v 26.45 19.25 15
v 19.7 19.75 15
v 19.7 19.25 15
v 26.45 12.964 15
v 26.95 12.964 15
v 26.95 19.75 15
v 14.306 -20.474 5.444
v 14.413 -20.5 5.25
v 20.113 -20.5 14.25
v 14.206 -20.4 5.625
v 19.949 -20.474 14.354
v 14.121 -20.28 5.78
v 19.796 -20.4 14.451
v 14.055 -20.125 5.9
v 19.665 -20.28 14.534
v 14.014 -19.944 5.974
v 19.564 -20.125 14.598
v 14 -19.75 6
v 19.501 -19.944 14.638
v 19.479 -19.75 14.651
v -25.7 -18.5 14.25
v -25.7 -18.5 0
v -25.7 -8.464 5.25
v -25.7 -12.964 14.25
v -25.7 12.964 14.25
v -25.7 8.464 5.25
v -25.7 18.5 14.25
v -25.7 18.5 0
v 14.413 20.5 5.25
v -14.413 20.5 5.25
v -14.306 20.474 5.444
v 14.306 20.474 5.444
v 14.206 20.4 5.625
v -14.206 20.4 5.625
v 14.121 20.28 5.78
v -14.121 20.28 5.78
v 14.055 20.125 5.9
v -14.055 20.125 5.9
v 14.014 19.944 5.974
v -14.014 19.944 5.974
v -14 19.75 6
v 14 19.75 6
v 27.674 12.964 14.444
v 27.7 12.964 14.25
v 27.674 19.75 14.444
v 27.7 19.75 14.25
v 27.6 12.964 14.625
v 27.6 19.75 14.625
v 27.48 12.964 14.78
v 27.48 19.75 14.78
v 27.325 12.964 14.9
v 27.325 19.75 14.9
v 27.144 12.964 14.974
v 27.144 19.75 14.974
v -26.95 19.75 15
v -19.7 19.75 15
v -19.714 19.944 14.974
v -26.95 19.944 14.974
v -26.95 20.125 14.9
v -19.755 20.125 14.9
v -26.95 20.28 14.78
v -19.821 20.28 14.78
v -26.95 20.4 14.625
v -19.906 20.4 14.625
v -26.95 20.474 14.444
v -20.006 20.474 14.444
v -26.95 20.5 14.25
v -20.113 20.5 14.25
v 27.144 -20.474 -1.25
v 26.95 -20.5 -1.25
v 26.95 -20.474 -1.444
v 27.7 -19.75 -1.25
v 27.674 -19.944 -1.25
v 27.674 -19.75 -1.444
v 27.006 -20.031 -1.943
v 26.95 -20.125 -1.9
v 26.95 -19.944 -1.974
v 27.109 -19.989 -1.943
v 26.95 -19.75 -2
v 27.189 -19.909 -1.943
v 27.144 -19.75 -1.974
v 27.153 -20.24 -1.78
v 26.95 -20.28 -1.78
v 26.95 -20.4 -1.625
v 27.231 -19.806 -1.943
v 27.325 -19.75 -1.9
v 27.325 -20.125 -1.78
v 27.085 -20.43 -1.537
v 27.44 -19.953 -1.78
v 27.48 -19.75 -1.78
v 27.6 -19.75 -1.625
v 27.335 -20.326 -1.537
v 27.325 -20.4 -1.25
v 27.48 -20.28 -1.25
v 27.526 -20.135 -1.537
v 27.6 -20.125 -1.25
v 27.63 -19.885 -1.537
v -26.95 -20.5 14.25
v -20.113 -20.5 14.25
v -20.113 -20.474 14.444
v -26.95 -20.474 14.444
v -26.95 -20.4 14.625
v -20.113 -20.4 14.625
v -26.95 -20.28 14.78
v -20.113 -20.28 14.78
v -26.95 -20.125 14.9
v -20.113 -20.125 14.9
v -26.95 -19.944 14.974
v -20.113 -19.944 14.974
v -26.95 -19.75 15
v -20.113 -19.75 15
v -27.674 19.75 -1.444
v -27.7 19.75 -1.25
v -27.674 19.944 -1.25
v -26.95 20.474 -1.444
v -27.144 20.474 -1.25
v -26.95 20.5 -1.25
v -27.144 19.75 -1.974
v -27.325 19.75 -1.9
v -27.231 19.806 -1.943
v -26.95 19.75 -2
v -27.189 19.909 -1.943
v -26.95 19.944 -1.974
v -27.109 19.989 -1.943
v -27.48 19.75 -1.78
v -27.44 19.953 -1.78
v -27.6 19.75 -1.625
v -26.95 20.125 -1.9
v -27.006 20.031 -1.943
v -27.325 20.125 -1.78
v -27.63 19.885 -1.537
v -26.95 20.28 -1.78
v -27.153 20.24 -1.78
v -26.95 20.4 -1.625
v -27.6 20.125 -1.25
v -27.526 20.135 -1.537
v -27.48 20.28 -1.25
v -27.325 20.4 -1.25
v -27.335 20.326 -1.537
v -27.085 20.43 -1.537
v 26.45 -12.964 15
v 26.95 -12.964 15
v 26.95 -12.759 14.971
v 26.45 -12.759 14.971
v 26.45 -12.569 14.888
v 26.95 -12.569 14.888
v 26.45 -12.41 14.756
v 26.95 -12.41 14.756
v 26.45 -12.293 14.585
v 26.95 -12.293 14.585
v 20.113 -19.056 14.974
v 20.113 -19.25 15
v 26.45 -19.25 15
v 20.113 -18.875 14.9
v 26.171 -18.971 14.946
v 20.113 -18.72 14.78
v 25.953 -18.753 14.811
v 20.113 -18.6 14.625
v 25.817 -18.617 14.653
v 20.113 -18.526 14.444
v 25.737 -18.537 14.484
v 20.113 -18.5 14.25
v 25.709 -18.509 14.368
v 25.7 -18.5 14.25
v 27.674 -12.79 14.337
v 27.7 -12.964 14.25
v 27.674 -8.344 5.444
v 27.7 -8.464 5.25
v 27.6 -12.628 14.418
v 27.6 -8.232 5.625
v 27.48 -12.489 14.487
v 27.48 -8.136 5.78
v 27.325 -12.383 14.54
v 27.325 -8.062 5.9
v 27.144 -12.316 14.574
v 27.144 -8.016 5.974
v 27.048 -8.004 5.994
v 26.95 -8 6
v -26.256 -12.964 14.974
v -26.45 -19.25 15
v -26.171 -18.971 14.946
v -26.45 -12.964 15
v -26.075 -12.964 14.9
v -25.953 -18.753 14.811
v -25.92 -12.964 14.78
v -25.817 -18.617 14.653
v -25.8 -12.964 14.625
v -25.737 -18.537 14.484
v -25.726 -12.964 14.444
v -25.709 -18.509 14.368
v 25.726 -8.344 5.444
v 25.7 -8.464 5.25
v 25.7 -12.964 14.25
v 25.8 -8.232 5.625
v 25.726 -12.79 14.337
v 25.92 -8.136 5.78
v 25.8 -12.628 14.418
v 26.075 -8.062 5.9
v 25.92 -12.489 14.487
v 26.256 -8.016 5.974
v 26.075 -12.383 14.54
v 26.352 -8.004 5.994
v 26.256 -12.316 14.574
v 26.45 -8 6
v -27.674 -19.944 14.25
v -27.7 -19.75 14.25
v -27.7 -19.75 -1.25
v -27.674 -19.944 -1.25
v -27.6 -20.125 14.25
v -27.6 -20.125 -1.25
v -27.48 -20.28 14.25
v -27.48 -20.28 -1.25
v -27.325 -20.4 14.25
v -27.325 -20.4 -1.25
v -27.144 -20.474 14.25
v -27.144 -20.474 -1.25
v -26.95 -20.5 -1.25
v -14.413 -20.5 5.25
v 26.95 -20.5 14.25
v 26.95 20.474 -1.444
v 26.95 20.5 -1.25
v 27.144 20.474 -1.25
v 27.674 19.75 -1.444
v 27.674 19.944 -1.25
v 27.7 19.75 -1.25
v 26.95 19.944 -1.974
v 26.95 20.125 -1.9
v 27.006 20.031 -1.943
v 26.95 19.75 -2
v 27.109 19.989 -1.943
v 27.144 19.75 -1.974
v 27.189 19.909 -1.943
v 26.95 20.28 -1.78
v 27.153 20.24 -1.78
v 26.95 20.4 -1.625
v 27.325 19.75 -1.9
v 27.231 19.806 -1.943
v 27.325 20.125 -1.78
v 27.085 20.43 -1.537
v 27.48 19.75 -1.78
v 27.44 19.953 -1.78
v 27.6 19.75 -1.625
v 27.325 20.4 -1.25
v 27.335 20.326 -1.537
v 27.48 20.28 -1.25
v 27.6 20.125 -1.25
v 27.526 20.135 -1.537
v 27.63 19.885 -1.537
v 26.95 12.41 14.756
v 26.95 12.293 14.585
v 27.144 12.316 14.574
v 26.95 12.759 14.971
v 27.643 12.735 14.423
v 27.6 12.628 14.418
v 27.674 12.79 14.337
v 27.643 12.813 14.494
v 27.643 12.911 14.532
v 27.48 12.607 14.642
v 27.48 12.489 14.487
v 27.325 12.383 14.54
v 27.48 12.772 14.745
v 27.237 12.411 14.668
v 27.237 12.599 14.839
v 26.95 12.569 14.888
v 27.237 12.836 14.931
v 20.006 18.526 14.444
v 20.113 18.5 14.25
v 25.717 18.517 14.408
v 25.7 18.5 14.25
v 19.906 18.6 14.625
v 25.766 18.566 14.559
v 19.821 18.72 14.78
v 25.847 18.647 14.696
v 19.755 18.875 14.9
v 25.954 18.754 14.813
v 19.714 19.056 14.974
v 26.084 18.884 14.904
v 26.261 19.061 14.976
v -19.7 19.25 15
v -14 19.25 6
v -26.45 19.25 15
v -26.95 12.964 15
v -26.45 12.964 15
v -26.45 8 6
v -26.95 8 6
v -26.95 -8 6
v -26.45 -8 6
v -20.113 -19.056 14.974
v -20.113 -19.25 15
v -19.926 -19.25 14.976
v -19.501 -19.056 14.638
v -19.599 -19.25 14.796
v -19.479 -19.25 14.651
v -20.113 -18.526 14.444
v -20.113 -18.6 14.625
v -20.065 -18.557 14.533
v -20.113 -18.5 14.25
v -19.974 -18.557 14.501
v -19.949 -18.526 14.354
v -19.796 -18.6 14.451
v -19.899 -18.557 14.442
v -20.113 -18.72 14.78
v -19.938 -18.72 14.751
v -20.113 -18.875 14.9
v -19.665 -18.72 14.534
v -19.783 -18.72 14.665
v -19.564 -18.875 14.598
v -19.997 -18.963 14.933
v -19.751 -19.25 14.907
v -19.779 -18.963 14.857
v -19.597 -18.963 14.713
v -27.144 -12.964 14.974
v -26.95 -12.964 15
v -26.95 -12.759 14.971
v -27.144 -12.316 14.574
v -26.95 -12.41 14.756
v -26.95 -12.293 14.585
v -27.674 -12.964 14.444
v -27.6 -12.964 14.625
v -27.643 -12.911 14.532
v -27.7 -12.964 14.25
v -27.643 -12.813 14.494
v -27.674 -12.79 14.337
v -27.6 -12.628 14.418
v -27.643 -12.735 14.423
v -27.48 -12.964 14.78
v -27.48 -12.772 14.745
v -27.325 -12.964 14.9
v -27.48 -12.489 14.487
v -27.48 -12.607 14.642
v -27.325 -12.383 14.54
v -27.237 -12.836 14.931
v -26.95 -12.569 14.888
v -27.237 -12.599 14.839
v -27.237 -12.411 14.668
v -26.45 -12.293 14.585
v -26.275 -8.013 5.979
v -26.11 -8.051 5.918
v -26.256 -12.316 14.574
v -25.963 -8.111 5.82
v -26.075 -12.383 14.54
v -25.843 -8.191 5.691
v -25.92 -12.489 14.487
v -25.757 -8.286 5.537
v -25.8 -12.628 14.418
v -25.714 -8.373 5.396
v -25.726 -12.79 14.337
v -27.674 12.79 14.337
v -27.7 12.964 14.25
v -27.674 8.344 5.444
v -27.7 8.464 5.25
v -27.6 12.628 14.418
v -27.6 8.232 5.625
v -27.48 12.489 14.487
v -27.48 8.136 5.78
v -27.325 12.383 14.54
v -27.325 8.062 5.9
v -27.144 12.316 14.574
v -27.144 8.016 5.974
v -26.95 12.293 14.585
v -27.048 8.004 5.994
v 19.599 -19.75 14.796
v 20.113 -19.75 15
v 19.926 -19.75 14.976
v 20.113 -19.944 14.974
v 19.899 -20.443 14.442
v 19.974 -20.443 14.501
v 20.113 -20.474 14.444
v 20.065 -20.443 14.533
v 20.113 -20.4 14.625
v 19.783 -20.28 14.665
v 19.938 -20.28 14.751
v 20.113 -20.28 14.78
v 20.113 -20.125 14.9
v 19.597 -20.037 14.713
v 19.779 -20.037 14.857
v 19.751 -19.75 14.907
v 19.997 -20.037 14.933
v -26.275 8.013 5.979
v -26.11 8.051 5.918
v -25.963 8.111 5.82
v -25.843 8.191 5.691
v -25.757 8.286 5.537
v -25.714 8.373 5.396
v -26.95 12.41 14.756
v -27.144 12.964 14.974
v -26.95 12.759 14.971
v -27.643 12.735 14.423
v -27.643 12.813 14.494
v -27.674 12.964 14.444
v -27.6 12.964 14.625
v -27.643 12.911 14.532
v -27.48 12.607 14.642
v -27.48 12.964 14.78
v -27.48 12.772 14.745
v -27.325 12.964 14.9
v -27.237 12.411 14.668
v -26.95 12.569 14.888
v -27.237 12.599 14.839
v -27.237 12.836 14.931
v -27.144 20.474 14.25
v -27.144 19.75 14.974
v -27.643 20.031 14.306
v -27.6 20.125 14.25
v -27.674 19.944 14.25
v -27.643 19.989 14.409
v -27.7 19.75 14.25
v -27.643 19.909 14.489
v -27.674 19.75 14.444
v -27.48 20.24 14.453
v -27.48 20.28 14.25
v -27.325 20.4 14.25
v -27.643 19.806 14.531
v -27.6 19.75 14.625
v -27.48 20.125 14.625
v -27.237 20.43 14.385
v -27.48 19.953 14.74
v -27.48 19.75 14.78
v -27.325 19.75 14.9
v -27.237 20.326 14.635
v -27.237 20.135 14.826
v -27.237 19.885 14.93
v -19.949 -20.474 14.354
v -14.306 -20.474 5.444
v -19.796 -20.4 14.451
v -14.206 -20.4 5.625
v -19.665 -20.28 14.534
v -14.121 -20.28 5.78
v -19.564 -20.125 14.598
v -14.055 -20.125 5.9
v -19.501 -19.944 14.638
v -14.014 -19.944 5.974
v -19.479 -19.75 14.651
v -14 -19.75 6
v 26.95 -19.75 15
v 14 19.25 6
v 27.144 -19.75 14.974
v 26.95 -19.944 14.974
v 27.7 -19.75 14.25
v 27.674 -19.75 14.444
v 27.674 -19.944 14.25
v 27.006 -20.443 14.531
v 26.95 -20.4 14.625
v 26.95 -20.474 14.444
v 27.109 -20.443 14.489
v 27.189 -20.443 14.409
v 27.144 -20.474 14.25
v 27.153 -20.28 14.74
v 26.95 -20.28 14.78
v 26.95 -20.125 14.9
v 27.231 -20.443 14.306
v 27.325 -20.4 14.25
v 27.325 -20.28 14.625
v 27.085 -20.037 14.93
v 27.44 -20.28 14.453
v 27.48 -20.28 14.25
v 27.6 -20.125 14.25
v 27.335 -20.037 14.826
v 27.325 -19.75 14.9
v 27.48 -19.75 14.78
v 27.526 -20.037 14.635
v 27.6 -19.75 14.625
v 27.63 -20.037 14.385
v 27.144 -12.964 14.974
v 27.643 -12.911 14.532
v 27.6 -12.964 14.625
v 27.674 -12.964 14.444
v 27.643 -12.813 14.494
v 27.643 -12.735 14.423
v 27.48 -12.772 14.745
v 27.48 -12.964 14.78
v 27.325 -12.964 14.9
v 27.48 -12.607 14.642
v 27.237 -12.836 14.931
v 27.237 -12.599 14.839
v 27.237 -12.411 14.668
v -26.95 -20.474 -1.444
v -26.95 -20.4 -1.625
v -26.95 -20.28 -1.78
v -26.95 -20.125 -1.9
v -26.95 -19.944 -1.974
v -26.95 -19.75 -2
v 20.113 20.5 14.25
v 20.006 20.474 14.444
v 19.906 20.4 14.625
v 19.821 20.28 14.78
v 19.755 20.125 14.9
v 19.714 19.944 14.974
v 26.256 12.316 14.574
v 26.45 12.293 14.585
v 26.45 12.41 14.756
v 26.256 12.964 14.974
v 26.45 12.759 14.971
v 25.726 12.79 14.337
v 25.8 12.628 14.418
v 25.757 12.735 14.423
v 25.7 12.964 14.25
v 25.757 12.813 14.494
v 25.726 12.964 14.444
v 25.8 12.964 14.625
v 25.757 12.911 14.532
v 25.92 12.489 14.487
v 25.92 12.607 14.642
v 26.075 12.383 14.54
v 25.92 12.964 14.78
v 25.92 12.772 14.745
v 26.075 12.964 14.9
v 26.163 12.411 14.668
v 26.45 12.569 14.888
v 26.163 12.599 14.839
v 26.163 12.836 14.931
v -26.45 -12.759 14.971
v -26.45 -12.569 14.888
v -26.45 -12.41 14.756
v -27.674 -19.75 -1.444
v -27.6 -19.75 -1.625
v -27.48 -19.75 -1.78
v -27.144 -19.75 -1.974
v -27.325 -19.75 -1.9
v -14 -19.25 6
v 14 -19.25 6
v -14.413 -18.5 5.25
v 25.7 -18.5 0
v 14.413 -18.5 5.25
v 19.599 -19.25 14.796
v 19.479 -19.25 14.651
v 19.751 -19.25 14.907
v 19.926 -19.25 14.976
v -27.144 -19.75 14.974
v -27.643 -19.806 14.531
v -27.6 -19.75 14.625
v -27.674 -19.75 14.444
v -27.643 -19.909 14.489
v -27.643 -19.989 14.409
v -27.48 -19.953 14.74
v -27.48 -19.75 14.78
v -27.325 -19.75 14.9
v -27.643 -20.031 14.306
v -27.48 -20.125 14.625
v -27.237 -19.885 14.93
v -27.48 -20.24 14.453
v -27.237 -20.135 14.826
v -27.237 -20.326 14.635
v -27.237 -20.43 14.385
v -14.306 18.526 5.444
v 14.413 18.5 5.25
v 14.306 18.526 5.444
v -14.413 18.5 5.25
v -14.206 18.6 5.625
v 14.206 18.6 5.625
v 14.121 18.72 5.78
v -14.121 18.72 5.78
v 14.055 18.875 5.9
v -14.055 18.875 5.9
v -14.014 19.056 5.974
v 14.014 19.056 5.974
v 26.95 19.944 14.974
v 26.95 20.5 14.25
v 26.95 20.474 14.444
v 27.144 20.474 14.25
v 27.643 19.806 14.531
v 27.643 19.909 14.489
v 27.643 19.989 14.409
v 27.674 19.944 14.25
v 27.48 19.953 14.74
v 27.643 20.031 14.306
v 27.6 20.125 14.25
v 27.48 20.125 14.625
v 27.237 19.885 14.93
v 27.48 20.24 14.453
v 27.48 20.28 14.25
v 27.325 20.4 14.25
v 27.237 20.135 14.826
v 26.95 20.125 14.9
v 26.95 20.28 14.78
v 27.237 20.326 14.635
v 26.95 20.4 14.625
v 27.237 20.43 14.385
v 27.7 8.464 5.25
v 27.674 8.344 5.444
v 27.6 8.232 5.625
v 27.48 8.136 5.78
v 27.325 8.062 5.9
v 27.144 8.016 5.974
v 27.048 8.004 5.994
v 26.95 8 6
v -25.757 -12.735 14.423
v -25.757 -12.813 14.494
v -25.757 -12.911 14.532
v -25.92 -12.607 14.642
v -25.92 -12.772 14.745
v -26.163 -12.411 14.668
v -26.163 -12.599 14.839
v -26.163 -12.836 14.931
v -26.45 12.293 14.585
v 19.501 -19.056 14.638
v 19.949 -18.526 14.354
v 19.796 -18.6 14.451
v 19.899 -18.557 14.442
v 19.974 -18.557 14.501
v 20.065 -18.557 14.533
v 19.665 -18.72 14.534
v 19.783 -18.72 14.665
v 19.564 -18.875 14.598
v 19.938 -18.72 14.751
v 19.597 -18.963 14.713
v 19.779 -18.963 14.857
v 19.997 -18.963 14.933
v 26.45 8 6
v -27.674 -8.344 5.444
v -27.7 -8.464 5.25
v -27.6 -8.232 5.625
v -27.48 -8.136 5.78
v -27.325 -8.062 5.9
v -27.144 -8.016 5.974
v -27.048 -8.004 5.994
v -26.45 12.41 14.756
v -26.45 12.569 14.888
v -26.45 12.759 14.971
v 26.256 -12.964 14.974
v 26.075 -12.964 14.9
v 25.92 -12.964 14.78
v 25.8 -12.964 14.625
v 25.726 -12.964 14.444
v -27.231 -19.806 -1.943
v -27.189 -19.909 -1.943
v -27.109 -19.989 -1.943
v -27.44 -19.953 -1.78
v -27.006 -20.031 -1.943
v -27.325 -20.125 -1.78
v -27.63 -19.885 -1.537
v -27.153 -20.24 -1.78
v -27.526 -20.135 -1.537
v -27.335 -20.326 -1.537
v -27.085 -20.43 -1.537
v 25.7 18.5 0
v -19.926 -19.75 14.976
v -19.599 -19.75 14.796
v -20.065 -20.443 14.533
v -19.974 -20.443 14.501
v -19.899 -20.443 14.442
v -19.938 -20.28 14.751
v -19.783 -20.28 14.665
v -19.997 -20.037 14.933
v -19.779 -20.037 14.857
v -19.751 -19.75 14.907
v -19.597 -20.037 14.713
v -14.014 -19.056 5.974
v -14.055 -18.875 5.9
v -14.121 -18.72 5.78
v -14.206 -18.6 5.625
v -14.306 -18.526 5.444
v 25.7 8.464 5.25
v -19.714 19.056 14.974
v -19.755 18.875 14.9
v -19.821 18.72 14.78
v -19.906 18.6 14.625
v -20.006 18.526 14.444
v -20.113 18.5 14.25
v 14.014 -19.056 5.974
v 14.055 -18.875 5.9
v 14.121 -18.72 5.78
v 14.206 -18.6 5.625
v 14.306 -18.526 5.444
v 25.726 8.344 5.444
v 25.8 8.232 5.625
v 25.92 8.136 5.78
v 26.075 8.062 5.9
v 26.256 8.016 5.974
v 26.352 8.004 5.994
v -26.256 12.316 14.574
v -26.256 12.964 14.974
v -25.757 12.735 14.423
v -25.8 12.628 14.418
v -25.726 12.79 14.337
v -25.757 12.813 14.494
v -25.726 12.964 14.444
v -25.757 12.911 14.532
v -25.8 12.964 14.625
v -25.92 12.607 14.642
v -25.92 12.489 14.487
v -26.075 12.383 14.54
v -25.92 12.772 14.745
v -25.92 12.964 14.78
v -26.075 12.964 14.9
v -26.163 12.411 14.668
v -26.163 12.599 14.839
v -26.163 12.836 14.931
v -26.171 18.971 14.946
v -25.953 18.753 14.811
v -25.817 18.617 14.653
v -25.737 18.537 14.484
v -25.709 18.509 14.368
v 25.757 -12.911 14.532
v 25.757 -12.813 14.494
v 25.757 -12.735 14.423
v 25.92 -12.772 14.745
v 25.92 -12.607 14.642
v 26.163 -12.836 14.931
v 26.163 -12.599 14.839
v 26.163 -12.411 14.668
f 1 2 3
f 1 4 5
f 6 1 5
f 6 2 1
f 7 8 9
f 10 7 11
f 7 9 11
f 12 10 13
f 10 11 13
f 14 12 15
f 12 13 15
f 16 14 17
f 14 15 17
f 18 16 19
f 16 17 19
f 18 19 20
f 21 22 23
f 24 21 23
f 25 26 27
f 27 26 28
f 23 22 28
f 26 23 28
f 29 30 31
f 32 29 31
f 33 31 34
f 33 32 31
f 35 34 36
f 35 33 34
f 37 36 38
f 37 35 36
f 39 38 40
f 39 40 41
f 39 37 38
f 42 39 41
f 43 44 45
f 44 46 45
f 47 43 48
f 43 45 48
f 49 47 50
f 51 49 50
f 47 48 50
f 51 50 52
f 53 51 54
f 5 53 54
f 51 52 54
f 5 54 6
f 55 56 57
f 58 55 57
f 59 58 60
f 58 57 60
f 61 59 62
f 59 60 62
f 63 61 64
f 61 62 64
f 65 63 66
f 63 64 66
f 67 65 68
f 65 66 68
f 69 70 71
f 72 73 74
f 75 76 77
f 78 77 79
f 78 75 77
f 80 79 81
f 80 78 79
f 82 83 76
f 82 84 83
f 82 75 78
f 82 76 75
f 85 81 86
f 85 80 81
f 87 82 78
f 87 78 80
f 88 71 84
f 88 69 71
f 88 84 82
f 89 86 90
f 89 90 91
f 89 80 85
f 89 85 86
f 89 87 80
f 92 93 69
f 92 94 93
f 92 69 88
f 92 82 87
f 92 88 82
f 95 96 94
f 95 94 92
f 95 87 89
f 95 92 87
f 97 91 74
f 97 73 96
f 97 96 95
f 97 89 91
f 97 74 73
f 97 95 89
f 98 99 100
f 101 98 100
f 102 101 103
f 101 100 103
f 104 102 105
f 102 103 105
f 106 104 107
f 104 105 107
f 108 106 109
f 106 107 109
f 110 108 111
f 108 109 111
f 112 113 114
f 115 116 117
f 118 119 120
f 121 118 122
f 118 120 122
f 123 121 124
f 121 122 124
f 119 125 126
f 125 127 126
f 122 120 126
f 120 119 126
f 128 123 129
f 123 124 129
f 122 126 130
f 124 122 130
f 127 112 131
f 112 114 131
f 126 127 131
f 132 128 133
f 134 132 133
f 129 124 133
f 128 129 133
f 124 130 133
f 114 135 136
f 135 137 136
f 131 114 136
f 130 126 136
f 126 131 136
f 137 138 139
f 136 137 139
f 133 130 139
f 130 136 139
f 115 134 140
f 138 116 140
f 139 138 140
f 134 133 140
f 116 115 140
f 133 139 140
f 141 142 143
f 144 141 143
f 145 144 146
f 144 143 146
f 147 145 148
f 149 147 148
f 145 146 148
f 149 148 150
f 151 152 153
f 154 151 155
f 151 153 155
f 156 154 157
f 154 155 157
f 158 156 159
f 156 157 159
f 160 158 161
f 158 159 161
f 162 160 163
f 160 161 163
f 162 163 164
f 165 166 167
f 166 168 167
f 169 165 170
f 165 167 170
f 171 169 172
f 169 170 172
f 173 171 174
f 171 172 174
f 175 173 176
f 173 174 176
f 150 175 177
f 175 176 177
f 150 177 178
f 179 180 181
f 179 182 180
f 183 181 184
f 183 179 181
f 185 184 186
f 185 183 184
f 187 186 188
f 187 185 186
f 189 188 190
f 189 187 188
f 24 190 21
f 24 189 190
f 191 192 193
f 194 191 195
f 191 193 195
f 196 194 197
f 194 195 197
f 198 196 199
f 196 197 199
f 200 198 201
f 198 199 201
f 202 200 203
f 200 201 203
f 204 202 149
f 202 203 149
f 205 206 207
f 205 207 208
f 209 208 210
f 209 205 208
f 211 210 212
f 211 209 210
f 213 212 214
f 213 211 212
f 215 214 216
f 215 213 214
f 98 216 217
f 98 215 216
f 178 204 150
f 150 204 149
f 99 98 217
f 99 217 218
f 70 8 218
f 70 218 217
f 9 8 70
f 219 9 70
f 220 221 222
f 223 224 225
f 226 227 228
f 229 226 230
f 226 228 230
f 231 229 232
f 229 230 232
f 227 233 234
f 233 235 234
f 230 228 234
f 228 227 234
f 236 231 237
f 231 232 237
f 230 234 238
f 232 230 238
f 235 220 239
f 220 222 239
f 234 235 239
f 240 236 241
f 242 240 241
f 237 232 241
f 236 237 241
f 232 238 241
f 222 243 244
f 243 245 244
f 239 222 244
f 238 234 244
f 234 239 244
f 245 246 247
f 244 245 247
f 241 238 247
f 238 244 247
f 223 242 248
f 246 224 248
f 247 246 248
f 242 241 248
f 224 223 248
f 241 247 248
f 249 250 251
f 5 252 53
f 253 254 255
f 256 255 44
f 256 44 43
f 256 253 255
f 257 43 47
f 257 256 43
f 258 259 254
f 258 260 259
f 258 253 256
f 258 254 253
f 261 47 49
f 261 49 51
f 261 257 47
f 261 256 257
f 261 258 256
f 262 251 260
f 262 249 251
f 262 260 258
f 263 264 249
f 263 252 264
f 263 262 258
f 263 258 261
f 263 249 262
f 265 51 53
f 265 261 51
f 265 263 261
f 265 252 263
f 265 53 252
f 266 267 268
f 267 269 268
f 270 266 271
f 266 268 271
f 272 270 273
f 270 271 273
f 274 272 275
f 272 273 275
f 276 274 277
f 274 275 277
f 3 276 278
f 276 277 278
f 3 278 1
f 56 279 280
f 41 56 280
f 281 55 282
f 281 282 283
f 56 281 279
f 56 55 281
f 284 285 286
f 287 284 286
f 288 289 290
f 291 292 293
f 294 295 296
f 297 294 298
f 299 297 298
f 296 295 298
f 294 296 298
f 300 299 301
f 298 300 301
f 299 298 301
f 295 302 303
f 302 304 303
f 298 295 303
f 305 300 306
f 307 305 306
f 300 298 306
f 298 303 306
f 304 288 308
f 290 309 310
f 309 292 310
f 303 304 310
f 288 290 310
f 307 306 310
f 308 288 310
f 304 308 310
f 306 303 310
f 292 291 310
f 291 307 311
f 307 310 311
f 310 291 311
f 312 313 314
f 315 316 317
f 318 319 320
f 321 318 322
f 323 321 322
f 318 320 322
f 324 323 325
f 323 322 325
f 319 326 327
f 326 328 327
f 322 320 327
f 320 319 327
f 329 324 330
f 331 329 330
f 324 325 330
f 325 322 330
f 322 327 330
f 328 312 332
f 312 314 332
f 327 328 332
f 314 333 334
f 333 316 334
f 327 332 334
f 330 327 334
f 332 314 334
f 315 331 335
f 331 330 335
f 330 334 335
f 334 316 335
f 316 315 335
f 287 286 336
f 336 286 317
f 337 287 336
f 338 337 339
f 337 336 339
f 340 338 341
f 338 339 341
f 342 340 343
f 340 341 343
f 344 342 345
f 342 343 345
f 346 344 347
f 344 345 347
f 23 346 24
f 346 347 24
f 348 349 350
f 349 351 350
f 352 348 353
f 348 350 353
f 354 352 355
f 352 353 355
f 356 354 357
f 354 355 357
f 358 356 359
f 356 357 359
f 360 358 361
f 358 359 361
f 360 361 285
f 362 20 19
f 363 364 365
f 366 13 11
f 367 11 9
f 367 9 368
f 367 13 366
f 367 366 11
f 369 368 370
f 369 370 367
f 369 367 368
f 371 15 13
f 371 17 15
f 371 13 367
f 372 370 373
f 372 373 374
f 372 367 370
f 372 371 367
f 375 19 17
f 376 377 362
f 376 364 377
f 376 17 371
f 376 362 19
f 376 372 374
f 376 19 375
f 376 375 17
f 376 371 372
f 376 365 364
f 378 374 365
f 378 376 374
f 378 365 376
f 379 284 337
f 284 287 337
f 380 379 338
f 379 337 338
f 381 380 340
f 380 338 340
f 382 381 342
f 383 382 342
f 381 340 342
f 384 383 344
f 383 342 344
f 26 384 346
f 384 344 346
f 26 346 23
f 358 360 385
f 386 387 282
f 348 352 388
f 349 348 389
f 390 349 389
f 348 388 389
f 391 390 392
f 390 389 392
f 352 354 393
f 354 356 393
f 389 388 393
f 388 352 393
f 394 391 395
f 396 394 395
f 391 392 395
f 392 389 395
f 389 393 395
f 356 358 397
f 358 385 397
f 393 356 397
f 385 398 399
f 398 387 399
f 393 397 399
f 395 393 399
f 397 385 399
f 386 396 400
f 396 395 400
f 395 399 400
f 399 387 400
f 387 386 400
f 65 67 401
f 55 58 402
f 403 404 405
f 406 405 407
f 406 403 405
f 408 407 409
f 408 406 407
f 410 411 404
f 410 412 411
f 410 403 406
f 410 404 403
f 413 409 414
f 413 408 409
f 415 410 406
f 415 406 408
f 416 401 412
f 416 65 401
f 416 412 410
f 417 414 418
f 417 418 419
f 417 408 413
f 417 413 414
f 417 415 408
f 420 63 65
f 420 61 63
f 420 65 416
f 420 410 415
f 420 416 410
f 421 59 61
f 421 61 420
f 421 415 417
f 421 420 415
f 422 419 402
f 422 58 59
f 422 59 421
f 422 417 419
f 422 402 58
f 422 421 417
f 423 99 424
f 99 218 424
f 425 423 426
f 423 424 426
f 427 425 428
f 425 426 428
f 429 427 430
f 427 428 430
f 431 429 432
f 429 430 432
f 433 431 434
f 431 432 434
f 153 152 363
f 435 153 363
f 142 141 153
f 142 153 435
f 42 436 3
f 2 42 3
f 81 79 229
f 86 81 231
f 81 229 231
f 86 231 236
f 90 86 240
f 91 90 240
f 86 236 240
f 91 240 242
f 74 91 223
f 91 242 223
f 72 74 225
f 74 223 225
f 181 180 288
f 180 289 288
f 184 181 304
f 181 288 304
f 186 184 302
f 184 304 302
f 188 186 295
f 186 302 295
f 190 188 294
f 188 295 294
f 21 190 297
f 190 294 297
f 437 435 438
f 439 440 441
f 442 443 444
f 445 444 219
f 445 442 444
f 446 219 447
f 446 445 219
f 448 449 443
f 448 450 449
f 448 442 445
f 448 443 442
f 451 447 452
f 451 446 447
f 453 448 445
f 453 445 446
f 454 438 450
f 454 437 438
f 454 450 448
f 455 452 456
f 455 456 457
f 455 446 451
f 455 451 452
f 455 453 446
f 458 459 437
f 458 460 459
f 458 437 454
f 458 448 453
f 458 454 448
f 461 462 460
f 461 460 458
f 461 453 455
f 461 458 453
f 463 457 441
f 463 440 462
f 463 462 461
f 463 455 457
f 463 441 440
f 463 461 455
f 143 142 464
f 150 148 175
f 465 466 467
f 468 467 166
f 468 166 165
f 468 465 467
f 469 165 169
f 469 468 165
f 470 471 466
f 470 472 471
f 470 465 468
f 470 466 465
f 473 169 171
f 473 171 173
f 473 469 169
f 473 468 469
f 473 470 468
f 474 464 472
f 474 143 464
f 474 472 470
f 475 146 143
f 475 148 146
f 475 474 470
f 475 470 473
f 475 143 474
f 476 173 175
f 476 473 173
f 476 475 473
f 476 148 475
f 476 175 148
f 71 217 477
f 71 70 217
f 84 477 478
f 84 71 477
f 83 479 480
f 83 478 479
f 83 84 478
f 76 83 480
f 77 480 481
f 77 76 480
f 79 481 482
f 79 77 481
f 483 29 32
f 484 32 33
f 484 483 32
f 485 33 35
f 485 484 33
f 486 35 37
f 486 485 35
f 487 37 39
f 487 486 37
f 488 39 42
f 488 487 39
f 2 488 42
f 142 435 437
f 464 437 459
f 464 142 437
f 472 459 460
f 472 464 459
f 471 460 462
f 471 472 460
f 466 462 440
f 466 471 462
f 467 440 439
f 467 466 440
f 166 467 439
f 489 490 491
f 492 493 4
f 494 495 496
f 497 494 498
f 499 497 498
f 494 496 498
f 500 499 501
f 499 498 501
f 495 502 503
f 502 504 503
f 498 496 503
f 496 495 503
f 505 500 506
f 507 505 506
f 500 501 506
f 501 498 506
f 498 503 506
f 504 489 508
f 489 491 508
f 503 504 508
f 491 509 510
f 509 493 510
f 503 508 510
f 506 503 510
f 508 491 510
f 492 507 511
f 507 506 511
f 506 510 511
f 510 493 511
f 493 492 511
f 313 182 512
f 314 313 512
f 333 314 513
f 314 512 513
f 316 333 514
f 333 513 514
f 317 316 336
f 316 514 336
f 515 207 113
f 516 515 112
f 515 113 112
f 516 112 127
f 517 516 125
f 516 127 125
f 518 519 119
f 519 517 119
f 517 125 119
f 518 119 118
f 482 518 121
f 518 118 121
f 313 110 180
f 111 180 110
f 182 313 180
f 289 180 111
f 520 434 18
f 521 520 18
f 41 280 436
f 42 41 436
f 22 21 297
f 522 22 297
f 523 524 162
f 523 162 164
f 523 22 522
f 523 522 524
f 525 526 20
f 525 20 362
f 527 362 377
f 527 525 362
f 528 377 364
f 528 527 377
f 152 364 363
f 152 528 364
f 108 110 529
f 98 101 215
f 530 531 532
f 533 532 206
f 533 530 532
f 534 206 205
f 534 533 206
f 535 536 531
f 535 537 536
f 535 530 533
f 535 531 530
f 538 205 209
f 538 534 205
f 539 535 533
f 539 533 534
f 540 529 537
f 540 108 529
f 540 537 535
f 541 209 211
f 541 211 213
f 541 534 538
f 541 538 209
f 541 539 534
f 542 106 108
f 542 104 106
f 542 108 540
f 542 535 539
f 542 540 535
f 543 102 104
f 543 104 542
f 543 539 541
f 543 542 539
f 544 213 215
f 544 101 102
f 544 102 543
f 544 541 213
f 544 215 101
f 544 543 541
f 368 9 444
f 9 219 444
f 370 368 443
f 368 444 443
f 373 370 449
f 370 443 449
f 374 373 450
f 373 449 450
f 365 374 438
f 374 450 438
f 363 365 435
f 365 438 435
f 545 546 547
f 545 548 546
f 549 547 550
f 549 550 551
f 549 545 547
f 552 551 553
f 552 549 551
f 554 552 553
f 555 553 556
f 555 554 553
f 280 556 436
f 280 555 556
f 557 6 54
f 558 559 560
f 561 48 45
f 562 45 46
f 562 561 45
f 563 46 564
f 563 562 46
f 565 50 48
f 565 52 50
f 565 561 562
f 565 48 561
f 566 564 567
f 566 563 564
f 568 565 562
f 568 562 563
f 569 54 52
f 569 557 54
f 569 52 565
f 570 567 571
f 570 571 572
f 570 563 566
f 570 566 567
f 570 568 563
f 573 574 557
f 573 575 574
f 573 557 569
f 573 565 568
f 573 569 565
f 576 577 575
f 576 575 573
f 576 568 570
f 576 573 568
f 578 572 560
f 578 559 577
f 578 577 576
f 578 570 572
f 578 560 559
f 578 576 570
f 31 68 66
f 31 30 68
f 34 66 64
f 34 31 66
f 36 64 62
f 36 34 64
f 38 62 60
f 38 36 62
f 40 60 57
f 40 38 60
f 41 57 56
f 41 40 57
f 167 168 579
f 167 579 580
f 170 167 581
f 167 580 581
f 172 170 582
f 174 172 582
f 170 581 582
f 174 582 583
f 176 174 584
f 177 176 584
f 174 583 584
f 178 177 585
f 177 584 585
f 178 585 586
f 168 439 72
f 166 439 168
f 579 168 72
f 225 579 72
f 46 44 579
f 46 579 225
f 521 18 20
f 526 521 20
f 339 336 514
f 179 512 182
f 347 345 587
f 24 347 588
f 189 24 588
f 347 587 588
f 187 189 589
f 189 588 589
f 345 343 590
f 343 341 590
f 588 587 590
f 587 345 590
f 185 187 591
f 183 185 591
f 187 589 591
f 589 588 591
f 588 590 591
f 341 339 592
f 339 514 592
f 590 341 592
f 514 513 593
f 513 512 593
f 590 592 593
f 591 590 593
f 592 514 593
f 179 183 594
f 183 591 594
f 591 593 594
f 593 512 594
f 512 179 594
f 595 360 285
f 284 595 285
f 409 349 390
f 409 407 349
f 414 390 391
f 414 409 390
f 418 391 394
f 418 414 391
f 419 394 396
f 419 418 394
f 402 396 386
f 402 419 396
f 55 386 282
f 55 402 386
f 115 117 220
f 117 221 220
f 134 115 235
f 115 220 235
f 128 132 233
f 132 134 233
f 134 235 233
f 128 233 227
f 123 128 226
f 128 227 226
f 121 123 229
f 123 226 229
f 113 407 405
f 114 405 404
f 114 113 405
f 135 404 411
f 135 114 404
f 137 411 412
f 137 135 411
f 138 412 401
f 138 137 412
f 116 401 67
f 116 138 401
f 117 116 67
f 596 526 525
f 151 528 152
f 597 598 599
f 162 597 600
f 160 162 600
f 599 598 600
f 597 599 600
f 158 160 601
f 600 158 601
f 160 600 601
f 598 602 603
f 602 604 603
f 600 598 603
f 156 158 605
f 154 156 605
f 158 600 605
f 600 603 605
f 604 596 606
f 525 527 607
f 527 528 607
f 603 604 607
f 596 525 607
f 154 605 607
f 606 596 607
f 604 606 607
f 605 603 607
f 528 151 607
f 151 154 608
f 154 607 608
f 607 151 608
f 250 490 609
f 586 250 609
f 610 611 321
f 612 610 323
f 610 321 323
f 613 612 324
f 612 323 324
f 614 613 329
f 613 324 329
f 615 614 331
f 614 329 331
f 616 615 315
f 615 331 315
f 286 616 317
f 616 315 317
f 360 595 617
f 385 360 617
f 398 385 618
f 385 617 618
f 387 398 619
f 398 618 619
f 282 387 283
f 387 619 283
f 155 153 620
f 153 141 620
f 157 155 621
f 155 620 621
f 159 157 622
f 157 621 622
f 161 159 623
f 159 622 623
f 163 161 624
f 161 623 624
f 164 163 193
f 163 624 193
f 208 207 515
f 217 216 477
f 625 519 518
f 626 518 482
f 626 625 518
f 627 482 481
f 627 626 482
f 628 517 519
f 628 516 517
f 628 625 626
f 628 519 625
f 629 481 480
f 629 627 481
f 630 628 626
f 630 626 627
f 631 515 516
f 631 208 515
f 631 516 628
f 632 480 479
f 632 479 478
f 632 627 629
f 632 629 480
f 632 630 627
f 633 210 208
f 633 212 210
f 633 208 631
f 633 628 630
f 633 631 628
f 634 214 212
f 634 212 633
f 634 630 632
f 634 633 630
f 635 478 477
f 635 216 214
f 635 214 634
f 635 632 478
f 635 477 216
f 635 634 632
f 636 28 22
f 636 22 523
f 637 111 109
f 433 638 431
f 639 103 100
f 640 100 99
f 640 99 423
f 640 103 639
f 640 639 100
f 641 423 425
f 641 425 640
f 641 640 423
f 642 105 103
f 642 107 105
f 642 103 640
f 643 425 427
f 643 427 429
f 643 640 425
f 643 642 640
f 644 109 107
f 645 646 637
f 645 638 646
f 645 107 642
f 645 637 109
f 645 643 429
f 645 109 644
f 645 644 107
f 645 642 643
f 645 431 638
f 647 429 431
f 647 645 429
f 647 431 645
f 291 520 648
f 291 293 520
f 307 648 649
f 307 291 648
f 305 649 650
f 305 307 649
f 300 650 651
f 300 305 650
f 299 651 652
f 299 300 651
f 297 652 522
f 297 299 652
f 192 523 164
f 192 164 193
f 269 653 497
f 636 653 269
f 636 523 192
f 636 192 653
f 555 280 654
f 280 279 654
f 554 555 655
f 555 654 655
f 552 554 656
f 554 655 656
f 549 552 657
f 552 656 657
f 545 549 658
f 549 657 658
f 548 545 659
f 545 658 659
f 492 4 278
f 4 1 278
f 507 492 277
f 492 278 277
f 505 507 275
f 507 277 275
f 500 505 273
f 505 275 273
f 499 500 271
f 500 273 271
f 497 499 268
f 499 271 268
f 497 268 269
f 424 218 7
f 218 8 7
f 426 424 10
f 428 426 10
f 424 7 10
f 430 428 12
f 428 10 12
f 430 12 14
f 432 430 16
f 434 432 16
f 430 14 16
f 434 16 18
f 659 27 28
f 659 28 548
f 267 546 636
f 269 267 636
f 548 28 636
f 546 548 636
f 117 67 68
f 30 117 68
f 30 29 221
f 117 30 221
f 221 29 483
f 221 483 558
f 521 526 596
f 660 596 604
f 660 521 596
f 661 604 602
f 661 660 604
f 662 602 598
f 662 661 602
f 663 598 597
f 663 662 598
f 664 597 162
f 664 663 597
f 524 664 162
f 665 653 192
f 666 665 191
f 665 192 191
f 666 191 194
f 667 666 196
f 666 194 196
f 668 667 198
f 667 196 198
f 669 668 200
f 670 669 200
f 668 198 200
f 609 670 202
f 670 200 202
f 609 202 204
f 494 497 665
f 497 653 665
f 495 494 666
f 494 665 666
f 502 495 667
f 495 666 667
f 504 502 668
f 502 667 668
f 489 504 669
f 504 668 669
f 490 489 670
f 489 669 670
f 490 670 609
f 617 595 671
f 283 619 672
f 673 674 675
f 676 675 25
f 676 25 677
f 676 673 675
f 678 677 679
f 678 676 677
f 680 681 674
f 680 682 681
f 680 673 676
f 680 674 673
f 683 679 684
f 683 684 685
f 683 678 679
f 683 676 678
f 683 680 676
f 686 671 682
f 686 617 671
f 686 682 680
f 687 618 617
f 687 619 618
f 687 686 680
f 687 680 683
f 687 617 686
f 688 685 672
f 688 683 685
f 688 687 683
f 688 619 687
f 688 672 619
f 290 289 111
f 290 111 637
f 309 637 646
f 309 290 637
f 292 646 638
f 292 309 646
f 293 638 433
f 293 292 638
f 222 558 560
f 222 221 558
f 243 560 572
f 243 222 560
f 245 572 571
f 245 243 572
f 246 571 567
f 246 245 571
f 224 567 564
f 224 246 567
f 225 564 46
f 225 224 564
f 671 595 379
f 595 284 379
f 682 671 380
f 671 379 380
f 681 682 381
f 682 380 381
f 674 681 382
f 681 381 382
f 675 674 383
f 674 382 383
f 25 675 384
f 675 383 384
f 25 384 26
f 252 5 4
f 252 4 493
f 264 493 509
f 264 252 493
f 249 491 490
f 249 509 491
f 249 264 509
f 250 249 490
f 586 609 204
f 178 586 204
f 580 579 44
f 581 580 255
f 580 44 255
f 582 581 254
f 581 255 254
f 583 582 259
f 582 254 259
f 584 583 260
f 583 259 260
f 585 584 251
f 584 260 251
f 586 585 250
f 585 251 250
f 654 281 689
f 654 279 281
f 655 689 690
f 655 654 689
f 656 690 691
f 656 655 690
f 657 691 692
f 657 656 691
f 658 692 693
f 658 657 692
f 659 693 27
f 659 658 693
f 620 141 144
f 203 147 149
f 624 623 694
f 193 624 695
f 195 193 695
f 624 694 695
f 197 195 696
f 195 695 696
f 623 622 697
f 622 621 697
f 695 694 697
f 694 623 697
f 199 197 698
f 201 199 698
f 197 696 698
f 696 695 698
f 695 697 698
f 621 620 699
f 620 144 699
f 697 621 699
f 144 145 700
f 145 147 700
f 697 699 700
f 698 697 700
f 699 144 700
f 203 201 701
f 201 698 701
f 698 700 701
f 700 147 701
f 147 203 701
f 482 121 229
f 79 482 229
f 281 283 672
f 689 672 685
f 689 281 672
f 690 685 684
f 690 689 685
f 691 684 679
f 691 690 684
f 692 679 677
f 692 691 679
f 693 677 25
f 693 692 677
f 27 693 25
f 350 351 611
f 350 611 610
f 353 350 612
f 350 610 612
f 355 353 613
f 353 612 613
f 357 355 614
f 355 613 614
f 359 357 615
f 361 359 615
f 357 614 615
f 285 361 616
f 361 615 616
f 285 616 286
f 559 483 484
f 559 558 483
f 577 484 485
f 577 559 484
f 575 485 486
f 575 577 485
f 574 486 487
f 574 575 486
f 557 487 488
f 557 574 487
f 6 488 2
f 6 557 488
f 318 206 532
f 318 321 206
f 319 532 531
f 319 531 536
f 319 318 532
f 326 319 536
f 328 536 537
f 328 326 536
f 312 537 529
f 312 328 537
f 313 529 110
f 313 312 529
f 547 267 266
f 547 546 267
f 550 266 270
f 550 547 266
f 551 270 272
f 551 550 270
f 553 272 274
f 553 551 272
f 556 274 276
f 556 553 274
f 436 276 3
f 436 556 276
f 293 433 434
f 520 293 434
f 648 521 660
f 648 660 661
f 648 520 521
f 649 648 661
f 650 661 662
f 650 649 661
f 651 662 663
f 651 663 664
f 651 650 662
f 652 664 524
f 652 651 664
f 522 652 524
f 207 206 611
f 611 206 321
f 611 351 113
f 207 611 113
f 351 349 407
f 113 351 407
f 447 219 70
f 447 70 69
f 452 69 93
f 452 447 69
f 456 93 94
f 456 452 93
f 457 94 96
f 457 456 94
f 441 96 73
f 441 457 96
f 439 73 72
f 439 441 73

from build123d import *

# Parameters (mm, degrees)
F0_W     = 55.4
F0_H     = 41
F0_W_2   = 51.4
F0_H_2   = 37
F1_DEPTH = 15
F2_DEPTH = 2
F4_DEPTH = 41.001
F6_DEPTH = 55.401
F7_R     = 0.75


with BuildPart() as f1:
    # F0 (on Top) → F1 (new body)
    with BuildSketch(Plane.XY):
        Rectangle(F0_W, F0_H)
        Rectangle(F0_W_2, F0_H_2, mode=Mode.SUBTRACT)
    extrude(amount=F1_DEPTH)

    # F0 (on Top) → F2 (join)
    with BuildSketch(Plane.XY):
        Rectangle(F0_W, F0_H)
        Rectangle(F0_W_2, F0_H_2, mode=Mode.SUBTRACT)
        Rectangle(F0_W_2, F0_H_2)
    extrude(amount=-F2_DEPTH)

    # F3 (on face) → F4 (cut, through all)
    with BuildSketch(Plane.XZ.offset(20.5)):
        Polygon((19.7, 15), (-19.7, 15), (-14, 6), (14, 6), align=None)
    extrude(amount=-F4_DEPTH, mode=Mode.SUBTRACT)

    # F5 (on face) → F6 (cut, through all)
    with BuildSketch(Plane(origin=(-27.7, 0, 0), x_dir=(0, -1, 0), z_dir=(-1, 0, 0))):
        Polygon((12.5, 15), (-12.5, 15), (-8.0000100486, 6), (8.0000100486, 6), align=None)
    extrude(amount=-F6_DEPTH, mode=Mode.SUBTRACT)

    # F7
    f7_edges = [f1.edges().sort_by_distance(p)[0] for p in [
        (0, 20.5, 6),
        (16.85, 20.5, 10.5),
        (23.7, 20.5, 15),
        (27.7, 16.5, 15),
        (27.7, 20.5, 6.5),
        (-16.85, 20.5, 10.5),
        (-23.7, 20.5, 15),
        (-27.7, 20.5, 6.5),
        (-27.7, 16.5, 15),
        (-25.7, 15.5, 15),
        (-22.7, 18.5, 15),
        (-16.85, 18.5, 10.5),
        (0, 18.5, 6),
        (16.85, 18.5, 10.5),
        (22.7, 18.5, 15),
        (25.7, 15.5, 15),
        (26.7, 12.5, 15),
        (27.7, 10.250005, 10.5),
        (25.7, 10.250005, 10.5),
        (25.7, 0, 6),
        (27.7, 0, 6),
        (27.7, -10.250005, 10.5),
        (25.7, -10.250005, 10.5),
        (26.7, -12.5, 15),
        (27.7, -16.5, 15),
        (25.7, -15.5, 15),
        (22.7, -18.5, 15),
        (23.7, -20.5, 15),
        (27.7, -20.5, 6.5),
        (19.7, -19.5, 15),
        (16.85, -18.5, 10.5),
        (16.85, -20.5, 10.5),
        (0, -20.5, 6),
        (0, -18.5, 6),
        (-16.85, -18.5, 10.5),
        (-16.85, -20.5, 10.5),
        (-19.7, -19.5, 15),
        (-22.7, -18.5, 15),
        (-23.7, -20.5, 15),
        (-25.7, -15.5, 15),
        (-26.7, -12.5, 15),
        (-27.7, -16.5, 15),
        (-25.7, -10.250005, 10.5),
        (-27.7, -10.250005, 10.5),
        (-26.7, 12.5, 15),
        (-27.7, 0, 6),
        (-25.7, 0, 6),
        (-25.7, 10.250005, 10.5),
        (-27.7, 10.250005, 10.5),
        (-27.7, -20.5, 6.5),
        (-27.7, 0, -2),
        (0, 20.5, -2),
        (0, -20.5, -2),
        (27.7, 0, -2),
    ]]
    fillet(f7_edges, radius=F7_R)


solid = f1.part
